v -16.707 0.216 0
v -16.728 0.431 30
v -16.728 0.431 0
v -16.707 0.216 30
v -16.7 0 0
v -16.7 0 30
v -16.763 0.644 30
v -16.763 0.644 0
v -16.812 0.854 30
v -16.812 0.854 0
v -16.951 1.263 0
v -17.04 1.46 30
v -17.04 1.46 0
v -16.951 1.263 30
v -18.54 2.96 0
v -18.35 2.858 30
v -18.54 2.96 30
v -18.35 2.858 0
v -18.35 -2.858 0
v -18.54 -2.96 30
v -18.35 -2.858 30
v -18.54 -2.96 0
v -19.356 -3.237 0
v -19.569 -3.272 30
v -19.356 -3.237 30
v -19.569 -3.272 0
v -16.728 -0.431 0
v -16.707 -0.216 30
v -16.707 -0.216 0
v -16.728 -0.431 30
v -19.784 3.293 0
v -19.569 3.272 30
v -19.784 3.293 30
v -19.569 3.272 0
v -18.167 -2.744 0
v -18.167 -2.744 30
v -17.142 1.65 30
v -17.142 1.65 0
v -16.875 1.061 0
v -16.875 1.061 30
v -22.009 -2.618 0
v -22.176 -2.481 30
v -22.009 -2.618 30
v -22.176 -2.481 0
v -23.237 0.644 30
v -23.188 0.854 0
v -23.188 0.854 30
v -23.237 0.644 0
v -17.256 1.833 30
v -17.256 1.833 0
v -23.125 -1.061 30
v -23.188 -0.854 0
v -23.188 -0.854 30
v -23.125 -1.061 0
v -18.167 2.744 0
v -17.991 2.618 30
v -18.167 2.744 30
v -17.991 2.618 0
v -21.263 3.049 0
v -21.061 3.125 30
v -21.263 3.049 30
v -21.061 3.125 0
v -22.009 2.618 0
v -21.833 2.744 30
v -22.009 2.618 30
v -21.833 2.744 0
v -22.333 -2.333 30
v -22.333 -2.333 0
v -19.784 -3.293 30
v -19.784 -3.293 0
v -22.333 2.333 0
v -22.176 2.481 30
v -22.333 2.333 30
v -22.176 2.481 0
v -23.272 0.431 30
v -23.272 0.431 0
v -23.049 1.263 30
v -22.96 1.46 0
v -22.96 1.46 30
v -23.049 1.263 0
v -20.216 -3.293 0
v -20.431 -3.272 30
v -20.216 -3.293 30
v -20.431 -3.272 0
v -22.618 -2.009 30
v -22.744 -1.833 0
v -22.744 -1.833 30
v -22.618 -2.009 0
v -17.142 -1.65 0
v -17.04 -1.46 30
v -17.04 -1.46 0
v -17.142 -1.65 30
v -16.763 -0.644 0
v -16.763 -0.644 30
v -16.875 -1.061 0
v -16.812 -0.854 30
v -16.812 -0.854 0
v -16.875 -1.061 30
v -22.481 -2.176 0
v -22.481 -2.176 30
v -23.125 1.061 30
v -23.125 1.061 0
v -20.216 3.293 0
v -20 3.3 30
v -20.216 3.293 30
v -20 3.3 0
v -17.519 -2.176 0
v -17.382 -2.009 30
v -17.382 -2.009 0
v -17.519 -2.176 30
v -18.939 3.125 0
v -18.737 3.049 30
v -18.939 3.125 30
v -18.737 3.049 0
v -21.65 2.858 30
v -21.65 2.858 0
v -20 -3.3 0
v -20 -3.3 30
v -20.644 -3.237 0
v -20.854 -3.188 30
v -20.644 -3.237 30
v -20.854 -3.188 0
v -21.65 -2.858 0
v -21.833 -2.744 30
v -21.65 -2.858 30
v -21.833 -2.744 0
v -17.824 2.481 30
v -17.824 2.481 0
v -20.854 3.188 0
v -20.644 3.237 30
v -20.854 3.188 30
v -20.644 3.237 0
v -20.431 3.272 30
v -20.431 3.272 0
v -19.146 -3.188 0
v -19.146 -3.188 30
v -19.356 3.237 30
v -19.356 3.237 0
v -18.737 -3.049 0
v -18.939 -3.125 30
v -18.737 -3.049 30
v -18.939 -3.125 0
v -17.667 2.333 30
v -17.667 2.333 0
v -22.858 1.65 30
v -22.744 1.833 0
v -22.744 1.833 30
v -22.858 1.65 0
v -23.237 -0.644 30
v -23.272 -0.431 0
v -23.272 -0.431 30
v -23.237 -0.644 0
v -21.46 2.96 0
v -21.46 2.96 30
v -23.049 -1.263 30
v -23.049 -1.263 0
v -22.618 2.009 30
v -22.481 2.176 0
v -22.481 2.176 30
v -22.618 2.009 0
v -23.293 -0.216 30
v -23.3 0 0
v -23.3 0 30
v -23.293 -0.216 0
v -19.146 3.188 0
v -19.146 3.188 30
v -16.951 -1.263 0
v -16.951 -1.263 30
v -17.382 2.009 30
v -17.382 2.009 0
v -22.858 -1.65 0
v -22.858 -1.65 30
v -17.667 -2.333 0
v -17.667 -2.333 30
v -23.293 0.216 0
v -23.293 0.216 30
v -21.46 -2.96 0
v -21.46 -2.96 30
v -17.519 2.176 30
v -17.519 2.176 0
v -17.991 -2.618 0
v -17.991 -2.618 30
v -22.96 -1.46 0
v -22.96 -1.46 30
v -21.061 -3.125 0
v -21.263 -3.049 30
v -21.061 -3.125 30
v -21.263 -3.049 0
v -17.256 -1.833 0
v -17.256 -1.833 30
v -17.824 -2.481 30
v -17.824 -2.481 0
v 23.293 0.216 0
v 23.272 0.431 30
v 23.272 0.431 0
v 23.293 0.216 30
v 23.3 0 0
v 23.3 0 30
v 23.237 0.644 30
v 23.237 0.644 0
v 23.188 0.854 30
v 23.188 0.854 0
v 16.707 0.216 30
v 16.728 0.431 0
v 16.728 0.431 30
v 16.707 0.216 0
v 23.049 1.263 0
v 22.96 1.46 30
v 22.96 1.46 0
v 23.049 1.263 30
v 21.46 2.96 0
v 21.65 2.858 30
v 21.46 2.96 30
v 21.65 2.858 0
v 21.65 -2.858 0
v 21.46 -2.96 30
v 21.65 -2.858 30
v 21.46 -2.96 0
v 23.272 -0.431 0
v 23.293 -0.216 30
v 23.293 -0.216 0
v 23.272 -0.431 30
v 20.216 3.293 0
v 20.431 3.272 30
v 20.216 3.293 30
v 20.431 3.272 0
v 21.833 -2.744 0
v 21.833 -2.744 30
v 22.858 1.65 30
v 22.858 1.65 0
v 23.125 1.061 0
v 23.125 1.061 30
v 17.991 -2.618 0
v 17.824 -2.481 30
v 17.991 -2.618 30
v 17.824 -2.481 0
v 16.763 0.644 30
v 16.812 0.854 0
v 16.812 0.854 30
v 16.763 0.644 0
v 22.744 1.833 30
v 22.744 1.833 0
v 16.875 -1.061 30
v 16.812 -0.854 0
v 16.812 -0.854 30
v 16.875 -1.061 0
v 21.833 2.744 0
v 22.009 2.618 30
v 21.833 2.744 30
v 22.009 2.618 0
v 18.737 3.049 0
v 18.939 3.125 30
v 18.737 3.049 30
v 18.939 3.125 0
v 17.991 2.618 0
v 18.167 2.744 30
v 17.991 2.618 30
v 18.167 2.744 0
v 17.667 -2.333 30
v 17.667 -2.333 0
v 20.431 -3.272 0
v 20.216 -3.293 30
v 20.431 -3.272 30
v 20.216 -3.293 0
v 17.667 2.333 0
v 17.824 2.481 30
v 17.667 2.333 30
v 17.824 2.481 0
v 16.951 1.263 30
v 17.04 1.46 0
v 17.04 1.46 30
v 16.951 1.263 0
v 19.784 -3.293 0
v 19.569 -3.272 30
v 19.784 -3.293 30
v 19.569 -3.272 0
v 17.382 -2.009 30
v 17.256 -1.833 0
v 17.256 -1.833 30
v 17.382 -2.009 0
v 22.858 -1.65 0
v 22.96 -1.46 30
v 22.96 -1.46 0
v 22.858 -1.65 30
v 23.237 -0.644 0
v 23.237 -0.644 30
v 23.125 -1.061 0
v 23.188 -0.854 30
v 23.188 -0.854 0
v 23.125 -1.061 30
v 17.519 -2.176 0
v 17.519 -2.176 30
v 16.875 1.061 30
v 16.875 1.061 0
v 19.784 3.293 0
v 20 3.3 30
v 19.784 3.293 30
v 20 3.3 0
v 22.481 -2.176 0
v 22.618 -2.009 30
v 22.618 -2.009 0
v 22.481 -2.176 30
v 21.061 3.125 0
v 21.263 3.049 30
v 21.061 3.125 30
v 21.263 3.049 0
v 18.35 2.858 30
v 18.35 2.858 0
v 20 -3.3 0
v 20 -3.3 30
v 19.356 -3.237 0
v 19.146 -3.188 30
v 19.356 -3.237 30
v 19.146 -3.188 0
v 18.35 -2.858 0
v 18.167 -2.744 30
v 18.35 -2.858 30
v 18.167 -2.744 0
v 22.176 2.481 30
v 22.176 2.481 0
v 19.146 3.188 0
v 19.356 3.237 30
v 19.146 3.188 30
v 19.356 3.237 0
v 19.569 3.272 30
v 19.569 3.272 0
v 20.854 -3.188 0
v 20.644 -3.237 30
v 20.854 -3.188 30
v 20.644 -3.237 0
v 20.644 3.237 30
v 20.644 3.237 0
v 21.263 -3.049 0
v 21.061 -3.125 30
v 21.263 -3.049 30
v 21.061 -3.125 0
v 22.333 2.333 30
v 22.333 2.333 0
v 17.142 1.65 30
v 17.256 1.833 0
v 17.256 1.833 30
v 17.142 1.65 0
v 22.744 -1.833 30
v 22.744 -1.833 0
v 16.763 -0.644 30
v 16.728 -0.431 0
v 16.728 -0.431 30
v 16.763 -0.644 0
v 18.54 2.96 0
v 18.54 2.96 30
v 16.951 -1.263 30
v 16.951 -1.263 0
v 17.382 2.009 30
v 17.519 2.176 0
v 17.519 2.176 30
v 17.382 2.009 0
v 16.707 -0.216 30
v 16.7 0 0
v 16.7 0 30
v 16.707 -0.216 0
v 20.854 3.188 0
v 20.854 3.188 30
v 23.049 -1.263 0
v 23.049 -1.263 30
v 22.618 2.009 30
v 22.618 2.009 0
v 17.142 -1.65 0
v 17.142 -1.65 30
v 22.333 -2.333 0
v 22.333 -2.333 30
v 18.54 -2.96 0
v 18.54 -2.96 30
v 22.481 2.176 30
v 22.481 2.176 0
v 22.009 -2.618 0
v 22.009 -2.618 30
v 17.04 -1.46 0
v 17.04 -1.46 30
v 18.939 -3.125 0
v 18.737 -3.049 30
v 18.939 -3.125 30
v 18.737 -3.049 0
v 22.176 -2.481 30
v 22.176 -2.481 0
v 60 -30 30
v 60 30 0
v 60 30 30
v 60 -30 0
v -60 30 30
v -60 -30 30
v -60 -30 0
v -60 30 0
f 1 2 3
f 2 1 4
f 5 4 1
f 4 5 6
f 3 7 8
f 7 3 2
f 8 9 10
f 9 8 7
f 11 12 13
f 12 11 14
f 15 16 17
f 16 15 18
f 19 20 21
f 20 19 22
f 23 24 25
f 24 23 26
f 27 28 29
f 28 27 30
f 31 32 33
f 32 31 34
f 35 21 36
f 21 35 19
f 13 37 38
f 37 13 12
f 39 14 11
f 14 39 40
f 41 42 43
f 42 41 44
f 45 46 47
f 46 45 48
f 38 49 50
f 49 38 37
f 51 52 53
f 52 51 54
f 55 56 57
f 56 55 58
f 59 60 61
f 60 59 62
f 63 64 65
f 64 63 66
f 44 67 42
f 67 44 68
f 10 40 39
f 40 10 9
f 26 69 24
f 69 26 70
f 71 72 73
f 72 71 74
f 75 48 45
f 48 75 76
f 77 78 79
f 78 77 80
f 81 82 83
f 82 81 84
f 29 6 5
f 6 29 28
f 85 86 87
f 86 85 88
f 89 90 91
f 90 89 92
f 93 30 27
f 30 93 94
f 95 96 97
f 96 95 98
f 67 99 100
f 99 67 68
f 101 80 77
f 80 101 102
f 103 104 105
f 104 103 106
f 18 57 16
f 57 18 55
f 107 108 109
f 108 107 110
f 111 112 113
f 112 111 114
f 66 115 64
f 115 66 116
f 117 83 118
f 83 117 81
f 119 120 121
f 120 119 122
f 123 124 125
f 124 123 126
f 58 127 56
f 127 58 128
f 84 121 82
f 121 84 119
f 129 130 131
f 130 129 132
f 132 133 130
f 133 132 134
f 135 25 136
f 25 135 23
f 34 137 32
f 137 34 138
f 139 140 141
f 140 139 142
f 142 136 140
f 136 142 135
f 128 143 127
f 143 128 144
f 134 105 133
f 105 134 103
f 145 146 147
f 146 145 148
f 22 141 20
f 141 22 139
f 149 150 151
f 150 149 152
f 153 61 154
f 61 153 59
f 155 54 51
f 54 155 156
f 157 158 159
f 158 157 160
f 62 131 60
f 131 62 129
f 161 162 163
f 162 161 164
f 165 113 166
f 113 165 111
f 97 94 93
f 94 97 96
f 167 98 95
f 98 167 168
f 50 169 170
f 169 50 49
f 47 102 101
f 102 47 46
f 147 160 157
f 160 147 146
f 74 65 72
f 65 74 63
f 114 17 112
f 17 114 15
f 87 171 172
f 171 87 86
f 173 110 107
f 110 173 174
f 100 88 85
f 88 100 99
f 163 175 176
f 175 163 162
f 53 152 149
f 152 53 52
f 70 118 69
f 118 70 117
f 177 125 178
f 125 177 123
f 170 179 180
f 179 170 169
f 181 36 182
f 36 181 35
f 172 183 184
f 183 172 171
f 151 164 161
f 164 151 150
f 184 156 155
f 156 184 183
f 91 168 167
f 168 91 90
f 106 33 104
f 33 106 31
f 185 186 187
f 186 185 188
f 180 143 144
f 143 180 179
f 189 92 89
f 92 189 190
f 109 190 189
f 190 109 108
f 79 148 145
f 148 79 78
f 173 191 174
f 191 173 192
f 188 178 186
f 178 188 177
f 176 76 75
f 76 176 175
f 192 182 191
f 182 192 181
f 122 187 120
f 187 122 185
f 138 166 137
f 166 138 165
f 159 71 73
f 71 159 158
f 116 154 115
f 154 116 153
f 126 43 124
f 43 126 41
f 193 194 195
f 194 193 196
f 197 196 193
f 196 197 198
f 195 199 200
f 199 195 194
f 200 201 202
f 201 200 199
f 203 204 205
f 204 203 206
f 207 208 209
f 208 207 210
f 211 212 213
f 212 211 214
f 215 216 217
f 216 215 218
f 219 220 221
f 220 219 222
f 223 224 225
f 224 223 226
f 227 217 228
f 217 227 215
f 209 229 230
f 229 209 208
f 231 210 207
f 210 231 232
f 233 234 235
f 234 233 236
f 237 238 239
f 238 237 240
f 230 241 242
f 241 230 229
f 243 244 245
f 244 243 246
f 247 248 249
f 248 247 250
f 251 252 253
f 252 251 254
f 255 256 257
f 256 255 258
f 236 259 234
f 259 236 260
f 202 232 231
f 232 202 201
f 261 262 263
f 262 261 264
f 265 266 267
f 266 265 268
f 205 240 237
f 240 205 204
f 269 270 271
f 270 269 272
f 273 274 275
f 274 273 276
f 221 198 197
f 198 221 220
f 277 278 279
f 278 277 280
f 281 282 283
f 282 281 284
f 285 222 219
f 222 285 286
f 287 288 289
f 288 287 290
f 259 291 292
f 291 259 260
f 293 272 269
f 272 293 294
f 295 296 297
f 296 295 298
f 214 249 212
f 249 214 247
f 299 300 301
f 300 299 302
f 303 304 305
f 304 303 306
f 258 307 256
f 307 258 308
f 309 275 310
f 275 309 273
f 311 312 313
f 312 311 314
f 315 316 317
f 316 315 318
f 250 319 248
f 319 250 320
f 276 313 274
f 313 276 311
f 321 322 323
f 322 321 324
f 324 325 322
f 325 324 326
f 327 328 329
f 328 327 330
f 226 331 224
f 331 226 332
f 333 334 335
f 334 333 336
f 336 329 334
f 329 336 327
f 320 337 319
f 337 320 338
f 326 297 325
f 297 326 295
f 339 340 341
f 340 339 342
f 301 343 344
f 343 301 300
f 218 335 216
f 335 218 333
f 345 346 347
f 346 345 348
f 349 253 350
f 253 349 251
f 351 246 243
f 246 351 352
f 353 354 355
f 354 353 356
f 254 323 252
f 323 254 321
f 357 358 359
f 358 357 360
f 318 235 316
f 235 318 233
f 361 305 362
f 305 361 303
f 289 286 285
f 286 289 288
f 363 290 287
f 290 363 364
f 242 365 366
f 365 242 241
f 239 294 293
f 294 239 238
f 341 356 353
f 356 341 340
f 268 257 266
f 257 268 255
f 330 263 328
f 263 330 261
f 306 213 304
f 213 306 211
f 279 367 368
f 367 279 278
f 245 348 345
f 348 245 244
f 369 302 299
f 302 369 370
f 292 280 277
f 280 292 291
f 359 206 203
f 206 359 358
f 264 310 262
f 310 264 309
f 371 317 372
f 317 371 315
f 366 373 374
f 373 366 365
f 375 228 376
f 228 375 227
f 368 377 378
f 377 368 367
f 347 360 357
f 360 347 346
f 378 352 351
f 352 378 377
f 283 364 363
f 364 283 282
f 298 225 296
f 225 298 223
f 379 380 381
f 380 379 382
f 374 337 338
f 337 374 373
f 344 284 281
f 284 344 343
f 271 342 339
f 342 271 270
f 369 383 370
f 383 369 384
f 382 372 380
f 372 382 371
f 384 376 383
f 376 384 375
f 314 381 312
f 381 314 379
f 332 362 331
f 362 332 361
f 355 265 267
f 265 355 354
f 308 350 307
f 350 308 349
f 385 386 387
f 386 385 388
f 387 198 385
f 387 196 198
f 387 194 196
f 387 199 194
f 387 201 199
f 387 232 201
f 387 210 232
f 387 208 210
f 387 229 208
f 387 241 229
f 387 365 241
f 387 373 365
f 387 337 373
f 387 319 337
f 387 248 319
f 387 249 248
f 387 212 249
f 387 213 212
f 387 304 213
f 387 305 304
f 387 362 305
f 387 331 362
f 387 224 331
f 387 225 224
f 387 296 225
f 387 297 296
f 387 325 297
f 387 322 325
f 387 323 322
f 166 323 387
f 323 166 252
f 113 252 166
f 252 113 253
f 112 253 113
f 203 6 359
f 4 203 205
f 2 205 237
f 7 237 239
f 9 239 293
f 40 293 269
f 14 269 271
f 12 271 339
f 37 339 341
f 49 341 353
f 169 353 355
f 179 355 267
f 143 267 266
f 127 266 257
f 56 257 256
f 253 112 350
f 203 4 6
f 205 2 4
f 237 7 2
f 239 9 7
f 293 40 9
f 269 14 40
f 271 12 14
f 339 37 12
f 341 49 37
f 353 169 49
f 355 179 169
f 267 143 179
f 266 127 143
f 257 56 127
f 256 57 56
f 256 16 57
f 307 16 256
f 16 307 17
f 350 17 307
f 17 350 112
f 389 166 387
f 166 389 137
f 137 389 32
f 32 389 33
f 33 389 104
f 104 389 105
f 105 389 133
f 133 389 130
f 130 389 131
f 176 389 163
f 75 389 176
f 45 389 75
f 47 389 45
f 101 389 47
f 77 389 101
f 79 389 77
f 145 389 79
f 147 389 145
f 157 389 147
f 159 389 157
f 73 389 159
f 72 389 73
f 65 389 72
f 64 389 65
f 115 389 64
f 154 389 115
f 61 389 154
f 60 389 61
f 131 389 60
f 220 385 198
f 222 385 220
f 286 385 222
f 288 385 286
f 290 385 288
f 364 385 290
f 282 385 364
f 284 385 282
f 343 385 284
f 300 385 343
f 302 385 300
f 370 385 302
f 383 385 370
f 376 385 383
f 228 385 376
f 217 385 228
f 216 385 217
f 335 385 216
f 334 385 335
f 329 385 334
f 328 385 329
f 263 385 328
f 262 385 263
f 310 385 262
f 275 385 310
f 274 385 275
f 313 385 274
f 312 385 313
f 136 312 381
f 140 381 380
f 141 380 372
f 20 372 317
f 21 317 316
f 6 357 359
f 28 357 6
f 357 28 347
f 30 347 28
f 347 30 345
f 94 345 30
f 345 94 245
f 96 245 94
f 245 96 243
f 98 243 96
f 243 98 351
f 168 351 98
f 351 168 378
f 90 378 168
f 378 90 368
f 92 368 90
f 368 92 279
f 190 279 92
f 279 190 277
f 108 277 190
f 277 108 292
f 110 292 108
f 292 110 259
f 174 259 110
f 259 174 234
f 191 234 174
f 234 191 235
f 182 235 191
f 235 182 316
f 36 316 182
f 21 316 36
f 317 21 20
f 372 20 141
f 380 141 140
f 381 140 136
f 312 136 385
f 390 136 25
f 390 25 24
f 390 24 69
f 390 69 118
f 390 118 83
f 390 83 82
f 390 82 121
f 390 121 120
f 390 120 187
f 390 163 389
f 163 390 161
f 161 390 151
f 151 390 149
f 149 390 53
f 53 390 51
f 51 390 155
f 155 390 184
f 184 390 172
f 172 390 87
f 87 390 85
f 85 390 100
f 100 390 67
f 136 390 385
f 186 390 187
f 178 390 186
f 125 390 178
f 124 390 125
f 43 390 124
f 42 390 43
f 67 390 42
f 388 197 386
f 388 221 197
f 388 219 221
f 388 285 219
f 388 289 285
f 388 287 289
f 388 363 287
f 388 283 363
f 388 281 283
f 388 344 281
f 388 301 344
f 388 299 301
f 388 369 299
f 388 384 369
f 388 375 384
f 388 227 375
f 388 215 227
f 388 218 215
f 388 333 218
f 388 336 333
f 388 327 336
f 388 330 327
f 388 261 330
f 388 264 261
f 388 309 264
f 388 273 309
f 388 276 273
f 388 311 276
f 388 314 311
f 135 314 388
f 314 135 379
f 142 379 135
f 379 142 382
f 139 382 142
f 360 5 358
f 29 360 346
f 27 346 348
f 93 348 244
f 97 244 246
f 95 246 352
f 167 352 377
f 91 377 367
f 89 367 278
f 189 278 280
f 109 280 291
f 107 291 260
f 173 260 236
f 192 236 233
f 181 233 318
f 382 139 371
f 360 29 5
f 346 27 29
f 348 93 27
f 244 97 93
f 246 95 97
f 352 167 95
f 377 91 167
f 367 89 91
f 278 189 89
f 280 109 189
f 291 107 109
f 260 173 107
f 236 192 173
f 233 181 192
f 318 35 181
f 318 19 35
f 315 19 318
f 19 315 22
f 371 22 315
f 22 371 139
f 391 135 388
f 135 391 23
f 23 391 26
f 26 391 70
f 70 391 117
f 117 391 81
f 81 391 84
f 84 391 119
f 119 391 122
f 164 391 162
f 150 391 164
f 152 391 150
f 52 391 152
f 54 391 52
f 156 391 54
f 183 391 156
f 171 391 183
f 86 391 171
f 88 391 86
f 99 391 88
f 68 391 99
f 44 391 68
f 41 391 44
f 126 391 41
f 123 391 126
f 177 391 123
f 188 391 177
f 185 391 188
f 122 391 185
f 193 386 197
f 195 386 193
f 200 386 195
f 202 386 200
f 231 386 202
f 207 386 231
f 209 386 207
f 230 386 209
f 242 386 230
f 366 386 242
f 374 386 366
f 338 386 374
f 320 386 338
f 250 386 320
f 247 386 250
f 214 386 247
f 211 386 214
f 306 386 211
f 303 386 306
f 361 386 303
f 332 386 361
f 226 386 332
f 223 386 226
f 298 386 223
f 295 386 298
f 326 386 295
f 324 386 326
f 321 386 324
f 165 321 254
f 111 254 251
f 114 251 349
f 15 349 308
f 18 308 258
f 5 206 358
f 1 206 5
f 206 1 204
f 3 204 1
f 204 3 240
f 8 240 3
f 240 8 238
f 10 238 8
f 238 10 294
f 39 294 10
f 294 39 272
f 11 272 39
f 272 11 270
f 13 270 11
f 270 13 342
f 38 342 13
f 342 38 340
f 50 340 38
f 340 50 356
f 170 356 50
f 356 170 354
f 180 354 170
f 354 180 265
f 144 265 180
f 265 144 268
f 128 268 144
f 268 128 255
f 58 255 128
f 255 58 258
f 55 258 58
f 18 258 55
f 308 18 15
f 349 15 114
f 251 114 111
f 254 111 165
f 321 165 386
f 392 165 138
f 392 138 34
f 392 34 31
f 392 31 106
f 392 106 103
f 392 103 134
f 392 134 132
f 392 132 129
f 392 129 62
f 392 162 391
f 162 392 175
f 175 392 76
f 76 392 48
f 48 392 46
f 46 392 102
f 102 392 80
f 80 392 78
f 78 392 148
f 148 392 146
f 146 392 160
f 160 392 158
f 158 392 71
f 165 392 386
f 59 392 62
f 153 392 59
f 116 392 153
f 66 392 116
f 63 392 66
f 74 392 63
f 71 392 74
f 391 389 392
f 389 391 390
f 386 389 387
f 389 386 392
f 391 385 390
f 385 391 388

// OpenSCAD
// Generated by PromptCAD Studio
$fn = 96;

difference() {
  union() {
    translate([-60, -30, 0]) cube([120, 60, 30]);
  }
  union() {
    translate([-20, 0, -1]) rotate([0, 0, 0]) cylinder(d=6.6, h=32);
    translate([20, 0, -1]) rotate([0, 0, 0]) cylinder(d=6.6, h=32);
  }
}

// Note: fillet/chamfer are preserved in model.py; OpenSCAD fallback does not apply them.
